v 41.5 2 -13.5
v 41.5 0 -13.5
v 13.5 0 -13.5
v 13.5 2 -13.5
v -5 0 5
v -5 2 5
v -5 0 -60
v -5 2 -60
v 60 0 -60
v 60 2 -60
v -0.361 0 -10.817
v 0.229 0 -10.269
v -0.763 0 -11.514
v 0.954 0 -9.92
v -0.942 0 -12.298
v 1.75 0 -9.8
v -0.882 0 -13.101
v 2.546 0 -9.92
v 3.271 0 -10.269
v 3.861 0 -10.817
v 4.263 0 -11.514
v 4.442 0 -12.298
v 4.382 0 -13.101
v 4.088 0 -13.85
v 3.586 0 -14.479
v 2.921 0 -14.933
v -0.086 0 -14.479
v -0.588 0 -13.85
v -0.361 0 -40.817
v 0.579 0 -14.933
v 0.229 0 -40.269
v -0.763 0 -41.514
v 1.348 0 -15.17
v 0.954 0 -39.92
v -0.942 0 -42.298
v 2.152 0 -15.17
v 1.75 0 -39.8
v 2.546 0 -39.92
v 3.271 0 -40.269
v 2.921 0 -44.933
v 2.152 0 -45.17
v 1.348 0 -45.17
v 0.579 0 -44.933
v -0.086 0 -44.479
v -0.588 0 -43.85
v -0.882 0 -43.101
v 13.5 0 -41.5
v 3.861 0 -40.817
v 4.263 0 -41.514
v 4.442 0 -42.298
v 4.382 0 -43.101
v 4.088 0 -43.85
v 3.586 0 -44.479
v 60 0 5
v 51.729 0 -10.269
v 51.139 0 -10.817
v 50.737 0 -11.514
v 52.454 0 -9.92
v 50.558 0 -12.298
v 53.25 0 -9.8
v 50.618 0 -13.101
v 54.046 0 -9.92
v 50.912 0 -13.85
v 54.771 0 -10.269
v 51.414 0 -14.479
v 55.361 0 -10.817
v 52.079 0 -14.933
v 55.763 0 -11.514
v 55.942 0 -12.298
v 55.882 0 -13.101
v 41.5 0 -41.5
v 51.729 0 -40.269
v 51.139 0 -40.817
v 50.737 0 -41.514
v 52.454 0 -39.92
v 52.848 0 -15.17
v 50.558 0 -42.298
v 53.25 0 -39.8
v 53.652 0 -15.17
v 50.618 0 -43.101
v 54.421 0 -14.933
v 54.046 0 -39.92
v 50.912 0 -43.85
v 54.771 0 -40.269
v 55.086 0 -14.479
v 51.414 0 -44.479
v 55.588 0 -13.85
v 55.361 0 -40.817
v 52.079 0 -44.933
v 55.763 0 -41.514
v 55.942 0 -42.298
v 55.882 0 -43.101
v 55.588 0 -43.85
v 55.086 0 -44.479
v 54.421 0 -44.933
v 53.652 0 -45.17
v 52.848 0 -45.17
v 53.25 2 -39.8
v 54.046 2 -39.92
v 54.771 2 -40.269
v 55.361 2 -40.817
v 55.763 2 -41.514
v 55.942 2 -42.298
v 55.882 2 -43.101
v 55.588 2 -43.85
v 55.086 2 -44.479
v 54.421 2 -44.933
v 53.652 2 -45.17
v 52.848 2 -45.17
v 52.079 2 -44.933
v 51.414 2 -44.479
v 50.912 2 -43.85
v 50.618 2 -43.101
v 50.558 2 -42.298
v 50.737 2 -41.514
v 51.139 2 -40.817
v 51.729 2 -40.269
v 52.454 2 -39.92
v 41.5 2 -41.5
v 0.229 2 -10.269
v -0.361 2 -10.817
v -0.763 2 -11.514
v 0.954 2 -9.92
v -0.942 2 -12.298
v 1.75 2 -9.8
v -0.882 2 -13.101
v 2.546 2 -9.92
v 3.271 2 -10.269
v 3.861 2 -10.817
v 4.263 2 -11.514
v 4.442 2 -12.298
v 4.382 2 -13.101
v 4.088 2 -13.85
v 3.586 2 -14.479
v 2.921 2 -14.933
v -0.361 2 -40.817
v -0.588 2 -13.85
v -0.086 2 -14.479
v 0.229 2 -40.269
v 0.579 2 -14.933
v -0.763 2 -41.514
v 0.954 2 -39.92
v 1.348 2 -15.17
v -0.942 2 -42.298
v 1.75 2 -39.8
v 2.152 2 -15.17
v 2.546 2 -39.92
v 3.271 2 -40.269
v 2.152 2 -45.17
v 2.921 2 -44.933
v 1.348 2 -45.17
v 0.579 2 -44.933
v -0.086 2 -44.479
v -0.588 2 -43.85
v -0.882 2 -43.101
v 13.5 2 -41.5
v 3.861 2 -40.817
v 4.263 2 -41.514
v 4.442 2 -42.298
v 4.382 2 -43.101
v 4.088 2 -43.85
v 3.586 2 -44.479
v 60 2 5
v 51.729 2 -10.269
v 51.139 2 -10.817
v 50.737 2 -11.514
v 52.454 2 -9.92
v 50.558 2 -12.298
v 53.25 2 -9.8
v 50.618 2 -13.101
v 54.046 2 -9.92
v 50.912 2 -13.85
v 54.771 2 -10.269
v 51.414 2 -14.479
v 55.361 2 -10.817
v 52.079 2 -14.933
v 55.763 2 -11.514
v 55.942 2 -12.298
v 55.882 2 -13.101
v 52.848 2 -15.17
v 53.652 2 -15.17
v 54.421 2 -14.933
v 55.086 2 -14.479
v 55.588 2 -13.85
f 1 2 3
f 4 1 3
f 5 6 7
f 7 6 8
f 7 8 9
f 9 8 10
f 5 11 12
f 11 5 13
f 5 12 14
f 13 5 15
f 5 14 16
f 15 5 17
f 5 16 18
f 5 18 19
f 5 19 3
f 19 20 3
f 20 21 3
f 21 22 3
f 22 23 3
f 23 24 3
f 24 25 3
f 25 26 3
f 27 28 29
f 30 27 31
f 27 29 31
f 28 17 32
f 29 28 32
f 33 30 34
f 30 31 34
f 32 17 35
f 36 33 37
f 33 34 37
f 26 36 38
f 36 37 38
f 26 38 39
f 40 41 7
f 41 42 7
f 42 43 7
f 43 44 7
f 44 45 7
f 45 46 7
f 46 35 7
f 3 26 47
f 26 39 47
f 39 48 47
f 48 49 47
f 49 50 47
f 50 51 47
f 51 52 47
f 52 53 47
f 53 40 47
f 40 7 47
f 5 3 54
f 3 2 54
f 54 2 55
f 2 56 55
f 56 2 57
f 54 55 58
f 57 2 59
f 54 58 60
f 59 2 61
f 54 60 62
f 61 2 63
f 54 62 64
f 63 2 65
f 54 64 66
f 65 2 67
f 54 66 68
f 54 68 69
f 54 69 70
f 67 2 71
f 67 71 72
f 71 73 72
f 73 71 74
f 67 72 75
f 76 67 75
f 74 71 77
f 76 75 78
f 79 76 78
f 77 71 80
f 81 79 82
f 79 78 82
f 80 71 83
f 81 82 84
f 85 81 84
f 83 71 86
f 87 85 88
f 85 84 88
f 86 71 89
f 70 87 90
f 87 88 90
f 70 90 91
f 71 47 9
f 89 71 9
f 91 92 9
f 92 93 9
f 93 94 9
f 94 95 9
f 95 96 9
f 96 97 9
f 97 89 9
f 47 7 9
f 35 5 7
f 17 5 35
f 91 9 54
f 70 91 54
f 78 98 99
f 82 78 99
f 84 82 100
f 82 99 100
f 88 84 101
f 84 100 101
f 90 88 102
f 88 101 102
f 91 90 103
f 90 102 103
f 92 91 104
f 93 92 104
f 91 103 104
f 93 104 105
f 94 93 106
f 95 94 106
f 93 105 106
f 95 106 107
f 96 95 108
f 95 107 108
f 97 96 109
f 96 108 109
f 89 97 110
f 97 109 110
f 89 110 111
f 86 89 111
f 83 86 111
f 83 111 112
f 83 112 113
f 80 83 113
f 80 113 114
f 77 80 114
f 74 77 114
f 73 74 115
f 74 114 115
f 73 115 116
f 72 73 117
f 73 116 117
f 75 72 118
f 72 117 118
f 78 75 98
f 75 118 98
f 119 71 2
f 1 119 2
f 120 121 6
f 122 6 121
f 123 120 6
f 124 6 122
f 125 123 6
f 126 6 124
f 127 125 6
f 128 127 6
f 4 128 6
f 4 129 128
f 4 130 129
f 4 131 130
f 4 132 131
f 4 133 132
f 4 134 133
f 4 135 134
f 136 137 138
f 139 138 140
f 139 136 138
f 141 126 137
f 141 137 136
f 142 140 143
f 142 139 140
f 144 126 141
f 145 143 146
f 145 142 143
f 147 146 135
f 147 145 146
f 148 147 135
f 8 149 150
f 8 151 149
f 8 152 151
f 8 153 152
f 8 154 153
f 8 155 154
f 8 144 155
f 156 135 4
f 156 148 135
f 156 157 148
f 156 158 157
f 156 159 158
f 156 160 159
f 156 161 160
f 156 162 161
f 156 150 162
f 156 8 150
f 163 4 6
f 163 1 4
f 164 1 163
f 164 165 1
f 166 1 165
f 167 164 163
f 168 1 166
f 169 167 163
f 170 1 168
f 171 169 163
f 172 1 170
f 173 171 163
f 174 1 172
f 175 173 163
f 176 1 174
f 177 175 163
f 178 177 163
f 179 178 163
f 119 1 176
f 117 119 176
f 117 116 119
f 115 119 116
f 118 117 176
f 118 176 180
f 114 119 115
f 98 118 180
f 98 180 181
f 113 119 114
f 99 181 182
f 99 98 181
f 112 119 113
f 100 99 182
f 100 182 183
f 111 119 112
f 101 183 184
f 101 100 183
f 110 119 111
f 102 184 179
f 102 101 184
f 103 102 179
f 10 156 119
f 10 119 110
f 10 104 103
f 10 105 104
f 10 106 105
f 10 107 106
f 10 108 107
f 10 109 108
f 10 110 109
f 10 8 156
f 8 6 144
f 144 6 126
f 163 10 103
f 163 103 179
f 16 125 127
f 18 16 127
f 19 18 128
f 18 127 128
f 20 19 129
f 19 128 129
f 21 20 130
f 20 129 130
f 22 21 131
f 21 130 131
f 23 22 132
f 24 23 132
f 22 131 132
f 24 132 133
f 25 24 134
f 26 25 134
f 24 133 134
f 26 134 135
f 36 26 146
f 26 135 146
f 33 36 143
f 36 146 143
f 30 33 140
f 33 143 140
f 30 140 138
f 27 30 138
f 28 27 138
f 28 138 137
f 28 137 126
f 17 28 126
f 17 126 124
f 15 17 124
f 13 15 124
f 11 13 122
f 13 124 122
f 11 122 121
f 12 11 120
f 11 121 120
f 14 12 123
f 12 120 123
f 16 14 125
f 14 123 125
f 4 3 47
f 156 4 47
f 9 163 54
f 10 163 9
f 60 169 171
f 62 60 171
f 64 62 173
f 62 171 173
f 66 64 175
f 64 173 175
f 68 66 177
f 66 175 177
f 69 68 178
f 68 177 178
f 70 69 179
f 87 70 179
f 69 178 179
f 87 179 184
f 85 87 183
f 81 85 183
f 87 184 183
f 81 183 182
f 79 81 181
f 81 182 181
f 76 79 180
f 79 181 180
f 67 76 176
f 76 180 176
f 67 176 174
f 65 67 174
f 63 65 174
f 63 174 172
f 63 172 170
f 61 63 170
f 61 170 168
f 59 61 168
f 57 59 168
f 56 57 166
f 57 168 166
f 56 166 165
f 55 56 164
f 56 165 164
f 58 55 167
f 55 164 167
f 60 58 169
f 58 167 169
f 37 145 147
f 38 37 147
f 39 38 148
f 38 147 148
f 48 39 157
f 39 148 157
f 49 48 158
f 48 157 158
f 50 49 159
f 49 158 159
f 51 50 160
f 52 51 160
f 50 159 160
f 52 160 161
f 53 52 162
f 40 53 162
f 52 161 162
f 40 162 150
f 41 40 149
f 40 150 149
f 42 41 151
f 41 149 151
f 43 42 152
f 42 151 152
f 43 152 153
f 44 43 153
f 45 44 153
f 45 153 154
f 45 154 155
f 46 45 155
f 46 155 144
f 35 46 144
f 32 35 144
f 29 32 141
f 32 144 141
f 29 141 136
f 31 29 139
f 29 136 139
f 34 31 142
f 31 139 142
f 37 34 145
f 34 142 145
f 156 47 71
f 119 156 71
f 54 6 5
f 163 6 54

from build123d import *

# Parameters (mm, degrees)
CROQUIS1_W              = 55
CROQUIS1_H              = 55
CROQUIS1_R              = 1.5
SALIENTE_EXTRUIR1_DEPTH = 2
CROQUIS3_W              = 65
CROQUIS3_H              = 65
CROQUIS3_W_2            = 55
CROQUIS3_H_2            = 55
SALIENTE_EXTRUIR2_DEPTH = 2
CROQUIS4_R              = 2.7
CORTAR_EXTRUIR1_DEPTH   = 2


with BuildPart() as part:
    # Croquis1 → Saliente-Extruir1 (new body)
    with BuildSketch(Plane(origin=(0, 0, 0), x_dir=(1, 0, 0), z_dir=(0, 1, 0))):
        with Locations((27.5, 27.5)):
            Rectangle(CROQUIS1_W, CROQUIS1_H)
        with Locations(Location((1.75, 42.5, 0), (0, 0, 270))):
            Circle(CROQUIS1_R, mode=Mode.SUBTRACT)
        with Locations(Location((1.75, 12.5, 0), (0, 0, 270))):
            Circle(CROQUIS1_R, mode=Mode.SUBTRACT)
        with Locations(Location((53.25, 42.5, 0), (0, 0, 90))):
            Circle(CROQUIS1_R, mode=Mode.SUBTRACT)
        with Locations(Location((53.25, 12.5, 0), (0, 0, 90))):
            Circle(CROQUIS1_R, mode=Mode.SUBTRACT)
        Polygon((13.5, 13.5), (27.5, 13.5), (41.5, 13.5), (41.5, 28.15), (41.5, 41.5), (27.5, 41.5), (13.5, 41.5), (13.5, 27.5), align=None, mode=Mode.SUBTRACT)
    extrude(amount=SALIENTE_EXTRUIR1_DEPTH)

    # Croquis3 → Saliente-Extruir2 (add)
    with BuildSketch(Plane(origin=(0, 2, 0), x_dir=(1, 0, 0), z_dir=(0, 1, 0))):
        with Locations((27.5, 27.5)):
            Rectangle(CROQUIS3_W, CROQUIS3_H)
        with Locations((27.5, 27.5)):
            Rectangle(CROQUIS3_W_2, CROQUIS3_H_2, mode=Mode.SUBTRACT)
    extrude(amount=-SALIENTE_EXTRUIR2_DEPTH)

    # Croquis4 → Cortar-Extruir1 (cut)
    with BuildSketch(Plane(origin=(0, 2, 0), x_dir=(1, 0, 0), z_dir=(0, 1, 0))):
        with Locations(Location((53.25, 42.5, 0), (0, 0, 270))):
            Circle(CROQUIS4_R)
        with Locations(Location((53.25, 12.5, 0), (0, 0, 270))):
            Circle(CROQUIS4_R)
        with Locations(Location((1.75, 12.5, 0), (0, 0, 270))):
            Circle(CROQUIS4_R)
        with Locations(Location((1.75, 42.5, 0), (0, 0, 270))):
            Circle(CROQUIS4_R)
    extrude(amount=-CORTAR_EXTRUIR1_DEPTH, mode=Mode.SUBTRACT)


solid = part.part
